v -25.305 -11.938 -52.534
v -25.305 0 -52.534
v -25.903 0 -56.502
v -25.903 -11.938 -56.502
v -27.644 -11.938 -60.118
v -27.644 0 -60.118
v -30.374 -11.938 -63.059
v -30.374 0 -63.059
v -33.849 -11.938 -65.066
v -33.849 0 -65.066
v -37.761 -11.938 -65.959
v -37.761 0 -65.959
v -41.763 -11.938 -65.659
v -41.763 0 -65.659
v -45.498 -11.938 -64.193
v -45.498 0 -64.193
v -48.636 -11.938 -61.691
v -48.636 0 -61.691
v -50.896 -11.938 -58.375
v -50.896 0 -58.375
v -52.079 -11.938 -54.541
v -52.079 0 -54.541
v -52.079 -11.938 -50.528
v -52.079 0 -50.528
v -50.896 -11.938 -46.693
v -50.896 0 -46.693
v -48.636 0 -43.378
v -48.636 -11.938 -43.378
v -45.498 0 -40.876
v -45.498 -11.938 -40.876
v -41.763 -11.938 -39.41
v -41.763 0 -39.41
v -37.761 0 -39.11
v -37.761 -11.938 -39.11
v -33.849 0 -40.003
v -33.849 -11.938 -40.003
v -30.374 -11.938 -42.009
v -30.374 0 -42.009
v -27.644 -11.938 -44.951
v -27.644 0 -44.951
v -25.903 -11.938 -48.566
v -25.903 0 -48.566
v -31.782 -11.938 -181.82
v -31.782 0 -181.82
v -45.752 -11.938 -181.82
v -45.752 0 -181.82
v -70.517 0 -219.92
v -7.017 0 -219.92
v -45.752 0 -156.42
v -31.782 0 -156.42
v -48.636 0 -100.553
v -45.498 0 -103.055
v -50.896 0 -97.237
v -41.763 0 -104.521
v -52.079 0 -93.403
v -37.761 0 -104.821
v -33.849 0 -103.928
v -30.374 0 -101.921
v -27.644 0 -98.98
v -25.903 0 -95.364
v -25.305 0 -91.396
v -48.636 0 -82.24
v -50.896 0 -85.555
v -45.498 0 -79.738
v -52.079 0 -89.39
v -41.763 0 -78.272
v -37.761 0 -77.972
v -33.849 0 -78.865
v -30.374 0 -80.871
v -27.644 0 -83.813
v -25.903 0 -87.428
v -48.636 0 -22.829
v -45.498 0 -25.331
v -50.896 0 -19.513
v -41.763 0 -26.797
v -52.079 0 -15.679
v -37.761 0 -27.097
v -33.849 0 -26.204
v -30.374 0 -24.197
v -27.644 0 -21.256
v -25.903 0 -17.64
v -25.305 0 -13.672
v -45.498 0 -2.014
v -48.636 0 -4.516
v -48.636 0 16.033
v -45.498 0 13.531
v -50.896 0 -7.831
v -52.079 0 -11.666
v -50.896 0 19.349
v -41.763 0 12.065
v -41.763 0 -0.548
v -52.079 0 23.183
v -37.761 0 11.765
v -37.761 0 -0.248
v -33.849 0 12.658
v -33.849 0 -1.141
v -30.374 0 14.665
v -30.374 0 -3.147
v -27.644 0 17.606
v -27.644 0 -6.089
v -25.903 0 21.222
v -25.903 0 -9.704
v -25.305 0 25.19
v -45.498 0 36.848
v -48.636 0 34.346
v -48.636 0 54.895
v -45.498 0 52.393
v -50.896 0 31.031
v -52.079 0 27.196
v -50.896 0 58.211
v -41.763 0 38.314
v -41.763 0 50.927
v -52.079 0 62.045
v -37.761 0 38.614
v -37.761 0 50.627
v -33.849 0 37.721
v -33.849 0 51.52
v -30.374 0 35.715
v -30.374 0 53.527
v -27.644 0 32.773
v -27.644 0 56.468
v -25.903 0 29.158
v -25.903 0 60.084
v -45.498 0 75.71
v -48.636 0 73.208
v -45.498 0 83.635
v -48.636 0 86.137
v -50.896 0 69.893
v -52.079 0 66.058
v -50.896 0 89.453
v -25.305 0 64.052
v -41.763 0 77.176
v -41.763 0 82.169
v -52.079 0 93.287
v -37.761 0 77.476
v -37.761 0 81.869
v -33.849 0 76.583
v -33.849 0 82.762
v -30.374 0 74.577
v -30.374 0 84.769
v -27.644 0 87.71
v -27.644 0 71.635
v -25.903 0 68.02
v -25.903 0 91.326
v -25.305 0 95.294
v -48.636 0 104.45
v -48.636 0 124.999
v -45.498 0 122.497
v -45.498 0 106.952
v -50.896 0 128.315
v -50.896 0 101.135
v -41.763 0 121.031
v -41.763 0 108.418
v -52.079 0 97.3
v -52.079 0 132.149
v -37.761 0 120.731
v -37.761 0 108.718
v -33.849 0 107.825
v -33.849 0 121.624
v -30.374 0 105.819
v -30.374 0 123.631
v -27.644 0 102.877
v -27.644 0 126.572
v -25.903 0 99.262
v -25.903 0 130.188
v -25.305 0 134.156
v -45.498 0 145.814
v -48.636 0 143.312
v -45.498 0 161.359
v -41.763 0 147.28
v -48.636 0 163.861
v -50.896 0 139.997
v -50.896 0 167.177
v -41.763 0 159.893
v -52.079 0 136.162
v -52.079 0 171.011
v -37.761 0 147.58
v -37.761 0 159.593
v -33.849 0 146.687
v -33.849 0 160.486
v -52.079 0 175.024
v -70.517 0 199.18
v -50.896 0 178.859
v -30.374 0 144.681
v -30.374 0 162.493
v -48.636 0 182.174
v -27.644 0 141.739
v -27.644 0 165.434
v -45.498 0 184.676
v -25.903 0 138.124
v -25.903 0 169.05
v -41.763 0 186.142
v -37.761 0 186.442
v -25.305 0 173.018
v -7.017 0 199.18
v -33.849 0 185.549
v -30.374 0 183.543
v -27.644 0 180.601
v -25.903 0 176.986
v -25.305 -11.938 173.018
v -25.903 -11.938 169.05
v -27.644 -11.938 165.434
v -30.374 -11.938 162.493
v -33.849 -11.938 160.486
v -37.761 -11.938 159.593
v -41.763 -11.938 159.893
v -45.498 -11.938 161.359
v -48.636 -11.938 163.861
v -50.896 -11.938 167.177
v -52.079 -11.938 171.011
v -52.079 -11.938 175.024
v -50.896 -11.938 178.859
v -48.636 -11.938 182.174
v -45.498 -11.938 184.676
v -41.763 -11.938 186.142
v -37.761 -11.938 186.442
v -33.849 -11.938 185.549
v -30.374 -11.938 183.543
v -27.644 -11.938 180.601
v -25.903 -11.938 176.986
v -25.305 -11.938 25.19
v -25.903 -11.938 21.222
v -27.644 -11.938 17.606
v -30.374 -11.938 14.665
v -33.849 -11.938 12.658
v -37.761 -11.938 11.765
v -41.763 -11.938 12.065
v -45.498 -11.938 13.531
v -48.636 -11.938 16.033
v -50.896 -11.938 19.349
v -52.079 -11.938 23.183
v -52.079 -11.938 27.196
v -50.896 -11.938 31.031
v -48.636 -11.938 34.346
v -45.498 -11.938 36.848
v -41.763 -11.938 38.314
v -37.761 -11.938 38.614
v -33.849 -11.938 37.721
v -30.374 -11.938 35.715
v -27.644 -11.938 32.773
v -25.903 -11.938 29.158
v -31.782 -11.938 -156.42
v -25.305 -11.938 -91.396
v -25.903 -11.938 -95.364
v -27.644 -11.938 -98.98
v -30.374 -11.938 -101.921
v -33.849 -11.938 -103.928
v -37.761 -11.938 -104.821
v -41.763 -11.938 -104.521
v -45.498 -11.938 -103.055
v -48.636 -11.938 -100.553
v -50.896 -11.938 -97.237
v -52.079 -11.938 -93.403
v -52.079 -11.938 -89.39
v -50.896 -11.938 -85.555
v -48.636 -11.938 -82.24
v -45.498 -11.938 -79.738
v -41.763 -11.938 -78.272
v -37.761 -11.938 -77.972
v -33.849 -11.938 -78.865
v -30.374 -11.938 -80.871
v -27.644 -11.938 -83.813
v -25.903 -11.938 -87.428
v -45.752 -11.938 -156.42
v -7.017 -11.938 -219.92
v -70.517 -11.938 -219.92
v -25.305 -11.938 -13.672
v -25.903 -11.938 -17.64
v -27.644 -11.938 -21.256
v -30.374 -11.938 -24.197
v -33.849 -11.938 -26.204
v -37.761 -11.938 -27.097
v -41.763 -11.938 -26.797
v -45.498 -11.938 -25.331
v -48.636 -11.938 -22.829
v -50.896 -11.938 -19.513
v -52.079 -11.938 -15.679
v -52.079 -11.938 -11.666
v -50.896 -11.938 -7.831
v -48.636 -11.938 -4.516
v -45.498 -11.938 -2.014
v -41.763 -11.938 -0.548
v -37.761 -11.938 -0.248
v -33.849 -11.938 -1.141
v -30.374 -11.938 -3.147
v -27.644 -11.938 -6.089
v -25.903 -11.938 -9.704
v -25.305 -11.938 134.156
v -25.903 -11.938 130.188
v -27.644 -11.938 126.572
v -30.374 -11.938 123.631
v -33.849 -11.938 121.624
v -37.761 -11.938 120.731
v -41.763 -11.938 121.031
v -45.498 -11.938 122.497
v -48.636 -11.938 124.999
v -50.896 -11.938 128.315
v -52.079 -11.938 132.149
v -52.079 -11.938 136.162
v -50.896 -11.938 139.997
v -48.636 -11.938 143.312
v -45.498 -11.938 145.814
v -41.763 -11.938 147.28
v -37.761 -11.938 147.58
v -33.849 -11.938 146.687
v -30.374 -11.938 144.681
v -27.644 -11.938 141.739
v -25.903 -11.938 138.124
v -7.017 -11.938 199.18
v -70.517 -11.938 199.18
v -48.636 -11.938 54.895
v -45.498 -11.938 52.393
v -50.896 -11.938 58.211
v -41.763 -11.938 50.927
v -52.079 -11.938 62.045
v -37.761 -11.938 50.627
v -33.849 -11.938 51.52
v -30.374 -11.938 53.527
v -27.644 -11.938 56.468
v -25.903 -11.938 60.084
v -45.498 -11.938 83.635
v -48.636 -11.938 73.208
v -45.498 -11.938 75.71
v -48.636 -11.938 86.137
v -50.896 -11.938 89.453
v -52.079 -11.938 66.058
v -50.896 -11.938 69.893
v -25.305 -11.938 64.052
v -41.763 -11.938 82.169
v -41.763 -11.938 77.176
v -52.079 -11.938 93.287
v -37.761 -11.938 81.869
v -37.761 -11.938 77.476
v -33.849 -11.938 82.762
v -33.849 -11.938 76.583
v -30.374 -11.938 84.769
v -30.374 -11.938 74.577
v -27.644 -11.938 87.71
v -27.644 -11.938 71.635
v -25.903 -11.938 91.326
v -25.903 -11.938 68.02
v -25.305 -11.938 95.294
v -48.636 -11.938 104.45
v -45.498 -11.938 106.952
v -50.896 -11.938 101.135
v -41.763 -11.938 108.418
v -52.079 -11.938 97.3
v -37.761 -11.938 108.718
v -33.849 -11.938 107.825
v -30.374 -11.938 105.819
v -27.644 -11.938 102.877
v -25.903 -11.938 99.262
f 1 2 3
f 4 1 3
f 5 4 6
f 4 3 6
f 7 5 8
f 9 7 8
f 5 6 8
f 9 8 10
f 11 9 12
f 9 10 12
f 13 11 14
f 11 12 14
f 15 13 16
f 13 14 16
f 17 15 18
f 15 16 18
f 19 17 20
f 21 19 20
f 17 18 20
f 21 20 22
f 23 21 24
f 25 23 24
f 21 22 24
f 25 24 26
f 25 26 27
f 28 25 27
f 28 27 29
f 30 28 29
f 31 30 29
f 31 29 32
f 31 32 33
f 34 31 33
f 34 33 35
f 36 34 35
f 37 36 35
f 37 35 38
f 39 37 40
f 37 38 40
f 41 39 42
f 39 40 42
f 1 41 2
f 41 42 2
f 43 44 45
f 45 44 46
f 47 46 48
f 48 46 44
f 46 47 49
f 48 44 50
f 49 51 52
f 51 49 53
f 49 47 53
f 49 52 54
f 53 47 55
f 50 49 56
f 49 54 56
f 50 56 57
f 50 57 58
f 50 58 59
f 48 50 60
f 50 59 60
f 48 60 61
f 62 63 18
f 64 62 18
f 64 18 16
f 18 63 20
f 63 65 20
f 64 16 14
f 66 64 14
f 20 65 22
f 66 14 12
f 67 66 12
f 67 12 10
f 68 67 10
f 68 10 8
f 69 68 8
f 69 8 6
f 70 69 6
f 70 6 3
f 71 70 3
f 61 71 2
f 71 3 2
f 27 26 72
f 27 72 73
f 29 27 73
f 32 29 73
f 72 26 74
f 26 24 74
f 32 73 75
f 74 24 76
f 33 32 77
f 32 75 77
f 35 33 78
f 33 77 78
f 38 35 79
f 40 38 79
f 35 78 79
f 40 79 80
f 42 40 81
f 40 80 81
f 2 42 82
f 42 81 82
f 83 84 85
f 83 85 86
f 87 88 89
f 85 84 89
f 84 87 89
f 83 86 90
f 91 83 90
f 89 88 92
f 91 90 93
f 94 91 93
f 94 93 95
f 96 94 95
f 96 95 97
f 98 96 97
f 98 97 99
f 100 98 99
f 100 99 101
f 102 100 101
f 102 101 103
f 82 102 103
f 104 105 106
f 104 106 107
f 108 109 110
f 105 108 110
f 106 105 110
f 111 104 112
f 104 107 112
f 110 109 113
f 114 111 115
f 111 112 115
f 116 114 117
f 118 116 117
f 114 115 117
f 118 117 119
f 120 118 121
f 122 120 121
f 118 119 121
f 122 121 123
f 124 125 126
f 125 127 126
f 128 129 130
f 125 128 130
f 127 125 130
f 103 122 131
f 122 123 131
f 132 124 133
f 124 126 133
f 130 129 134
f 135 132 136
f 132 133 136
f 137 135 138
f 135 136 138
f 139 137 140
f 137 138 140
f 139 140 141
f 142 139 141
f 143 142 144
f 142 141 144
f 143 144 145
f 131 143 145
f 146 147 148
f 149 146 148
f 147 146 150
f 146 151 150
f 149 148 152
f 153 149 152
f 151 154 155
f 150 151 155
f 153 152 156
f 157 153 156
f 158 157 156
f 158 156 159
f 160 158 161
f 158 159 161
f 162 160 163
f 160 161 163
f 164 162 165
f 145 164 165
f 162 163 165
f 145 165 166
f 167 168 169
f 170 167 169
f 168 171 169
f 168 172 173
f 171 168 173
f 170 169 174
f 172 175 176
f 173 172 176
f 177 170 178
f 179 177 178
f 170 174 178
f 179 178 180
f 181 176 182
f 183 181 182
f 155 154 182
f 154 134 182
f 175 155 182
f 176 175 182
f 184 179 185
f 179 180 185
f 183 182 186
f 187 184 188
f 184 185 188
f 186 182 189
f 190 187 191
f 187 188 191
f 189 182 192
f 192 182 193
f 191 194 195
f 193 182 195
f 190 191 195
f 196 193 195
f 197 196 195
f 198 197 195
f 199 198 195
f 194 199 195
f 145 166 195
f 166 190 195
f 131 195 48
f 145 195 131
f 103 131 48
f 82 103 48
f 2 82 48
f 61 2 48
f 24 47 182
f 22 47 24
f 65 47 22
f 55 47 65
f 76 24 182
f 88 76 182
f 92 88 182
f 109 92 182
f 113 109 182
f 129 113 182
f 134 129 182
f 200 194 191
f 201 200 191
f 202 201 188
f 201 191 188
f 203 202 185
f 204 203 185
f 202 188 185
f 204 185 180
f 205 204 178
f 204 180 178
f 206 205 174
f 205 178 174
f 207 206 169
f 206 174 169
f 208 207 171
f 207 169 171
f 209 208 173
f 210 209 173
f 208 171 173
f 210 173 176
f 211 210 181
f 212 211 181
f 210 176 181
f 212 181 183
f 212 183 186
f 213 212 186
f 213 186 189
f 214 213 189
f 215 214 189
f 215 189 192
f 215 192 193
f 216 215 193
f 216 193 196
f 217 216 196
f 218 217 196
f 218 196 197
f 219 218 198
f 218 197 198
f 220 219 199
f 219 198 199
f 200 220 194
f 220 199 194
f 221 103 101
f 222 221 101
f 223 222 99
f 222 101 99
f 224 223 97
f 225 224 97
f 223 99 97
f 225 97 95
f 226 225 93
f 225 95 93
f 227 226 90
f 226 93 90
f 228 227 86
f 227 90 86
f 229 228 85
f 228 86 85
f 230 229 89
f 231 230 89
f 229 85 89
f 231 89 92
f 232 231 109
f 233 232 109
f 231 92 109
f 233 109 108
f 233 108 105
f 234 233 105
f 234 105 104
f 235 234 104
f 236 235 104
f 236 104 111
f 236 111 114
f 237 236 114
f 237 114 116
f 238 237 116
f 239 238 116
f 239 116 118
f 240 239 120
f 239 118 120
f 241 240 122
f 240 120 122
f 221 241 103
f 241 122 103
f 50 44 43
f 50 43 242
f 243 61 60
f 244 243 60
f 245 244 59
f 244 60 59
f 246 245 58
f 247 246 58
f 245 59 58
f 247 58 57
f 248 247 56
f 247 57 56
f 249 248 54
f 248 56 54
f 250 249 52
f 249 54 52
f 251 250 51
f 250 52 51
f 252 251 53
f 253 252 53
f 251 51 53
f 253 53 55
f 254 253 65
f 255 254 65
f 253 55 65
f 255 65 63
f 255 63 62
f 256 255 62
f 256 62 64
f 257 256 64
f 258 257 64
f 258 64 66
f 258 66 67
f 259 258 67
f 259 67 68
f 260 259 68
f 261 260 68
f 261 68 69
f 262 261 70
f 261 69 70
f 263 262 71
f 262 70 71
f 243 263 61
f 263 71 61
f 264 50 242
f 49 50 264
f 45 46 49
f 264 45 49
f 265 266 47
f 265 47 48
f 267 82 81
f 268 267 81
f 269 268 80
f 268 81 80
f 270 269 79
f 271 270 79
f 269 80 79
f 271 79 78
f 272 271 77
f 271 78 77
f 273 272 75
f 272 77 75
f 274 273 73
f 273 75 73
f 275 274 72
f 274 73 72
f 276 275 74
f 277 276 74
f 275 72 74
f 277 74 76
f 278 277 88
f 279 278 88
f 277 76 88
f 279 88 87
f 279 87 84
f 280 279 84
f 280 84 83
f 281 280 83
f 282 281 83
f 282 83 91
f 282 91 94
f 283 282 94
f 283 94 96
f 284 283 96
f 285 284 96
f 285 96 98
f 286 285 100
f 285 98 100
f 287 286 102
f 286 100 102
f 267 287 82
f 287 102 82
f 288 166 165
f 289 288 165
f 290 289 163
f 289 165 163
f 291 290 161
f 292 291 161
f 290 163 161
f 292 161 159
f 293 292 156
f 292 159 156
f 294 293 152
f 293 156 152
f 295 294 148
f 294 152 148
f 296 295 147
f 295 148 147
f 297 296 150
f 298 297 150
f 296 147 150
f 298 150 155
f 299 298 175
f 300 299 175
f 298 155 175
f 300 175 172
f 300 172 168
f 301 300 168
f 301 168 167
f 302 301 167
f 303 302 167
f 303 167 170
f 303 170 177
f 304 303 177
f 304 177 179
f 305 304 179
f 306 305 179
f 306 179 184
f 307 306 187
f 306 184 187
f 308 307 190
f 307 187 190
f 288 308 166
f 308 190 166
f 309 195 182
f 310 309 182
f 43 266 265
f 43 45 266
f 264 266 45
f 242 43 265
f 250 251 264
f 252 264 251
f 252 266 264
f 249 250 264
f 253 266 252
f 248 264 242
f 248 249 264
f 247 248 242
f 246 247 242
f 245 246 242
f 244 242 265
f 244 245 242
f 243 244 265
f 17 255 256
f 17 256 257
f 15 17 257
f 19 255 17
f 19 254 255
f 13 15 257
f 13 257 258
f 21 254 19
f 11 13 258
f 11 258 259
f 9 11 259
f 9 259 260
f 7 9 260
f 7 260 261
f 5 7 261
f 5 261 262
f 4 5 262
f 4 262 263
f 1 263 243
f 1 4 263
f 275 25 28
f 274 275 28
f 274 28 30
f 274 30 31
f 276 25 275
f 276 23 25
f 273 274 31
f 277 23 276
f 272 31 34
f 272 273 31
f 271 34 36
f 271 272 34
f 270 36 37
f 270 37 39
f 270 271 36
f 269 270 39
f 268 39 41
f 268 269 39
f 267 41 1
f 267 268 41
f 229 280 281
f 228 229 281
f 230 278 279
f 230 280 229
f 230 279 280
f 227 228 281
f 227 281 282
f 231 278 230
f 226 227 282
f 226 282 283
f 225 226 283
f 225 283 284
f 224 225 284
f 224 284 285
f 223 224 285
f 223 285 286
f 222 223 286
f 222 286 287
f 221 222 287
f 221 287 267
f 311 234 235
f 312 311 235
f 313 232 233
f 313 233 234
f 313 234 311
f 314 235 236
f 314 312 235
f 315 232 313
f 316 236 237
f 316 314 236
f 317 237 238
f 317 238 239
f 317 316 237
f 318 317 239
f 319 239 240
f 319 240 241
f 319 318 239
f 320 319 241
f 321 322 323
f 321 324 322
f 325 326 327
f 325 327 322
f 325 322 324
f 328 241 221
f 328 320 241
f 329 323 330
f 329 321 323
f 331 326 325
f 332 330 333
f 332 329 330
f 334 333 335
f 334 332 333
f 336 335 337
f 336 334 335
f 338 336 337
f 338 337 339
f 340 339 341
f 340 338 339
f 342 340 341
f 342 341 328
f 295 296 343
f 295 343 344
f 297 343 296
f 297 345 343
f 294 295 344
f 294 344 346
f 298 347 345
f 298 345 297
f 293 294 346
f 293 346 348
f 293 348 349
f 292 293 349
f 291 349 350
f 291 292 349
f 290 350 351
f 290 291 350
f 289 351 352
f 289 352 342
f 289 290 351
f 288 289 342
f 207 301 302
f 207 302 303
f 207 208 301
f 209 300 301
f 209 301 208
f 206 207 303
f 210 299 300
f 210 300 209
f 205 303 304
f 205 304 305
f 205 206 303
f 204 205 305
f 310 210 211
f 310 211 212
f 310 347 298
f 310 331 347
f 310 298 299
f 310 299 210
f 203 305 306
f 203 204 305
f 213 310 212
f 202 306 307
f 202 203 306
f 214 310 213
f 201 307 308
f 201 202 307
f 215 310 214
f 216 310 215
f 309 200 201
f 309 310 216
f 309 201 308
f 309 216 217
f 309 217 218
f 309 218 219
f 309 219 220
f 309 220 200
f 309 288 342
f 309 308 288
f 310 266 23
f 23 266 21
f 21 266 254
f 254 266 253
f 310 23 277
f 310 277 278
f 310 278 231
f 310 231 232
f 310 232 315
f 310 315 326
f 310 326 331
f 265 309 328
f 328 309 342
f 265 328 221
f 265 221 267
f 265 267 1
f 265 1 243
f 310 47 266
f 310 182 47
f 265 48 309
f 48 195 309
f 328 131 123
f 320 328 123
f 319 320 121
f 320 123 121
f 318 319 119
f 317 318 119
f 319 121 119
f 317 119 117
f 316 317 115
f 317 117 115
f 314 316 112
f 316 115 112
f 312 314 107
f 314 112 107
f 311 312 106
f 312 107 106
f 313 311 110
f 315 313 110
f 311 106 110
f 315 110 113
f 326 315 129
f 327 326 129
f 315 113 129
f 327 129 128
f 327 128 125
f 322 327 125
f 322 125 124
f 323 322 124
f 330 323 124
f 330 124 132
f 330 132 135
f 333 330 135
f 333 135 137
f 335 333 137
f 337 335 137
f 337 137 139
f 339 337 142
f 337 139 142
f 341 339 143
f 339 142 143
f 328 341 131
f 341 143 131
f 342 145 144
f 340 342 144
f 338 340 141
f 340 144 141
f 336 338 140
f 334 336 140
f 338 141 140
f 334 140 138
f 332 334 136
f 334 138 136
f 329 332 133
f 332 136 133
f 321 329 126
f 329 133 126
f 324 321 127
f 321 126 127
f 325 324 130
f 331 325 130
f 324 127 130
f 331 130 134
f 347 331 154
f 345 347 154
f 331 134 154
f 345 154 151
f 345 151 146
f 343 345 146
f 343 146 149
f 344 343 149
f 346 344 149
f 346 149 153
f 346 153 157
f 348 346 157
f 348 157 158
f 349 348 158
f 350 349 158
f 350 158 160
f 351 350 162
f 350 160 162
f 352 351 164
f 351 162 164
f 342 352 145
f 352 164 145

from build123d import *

# Parameters (mm, degrees)
F0_W     = 63.5
F0_H     = 38.862
F0_H_2   = 26.162
F0_H_3   = 12.7
F1_DEPTH = 11.938
F2_W     = 13.97
F2_H     = 25.4
F3_DEPTH = 25.4
F4_W     = 63.5
F4_H     = 11.938
F5_DEPTH = 11.938


with BuildPart() as f1:
    # F0 (on Front) → F1 (new body)
    with BuildSketch(Plane.XZ):
        with BuildLine():
            Line((-70.517269, 199.179671), (-70.517269, 173.017671))
            Line((-70.517269, 173.017671), (-52.229269, 173.017671))
            ThreePointArc((-52.229269, 173.017671), (-38.767269, 186.479671), (-25.305269, 173.017671))
            Line((-25.305269, 173.017671), (-7.017269, 173.017671))
            Line((-7.017269, 173.017671), (-7.017269, 199.179671))
            Line((-7.017269, 199.179671), (-70.517269, 199.179671))
        make_face()
        with BuildLine():
            Line((-70.517269, 173.017671), (-70.517269, 134.155671))
            Line((-70.517269, 134.155671), (-52.229269, 134.155671))
            ThreePointArc((-52.229269, 134.155671), (-38.767269, 147.617671), (-25.305269, 134.155671))
            Line((-25.305269, 134.155671), (-7.017269, 134.155671))
            Line((-7.017269, 134.155671), (-7.017269, 173.017671))
            Line((-7.017269, 173.017671), (-25.305269, 173.017671))
            ThreePointArc((-25.305269, 173.017671), (-38.767269, 159.555671), (-52.229269, 173.017671))
            Line((-52.229269, 173.017671), (-70.517269, 173.017671))
        make_face()
        with BuildLine():
            Line((-70.517269, 134.155671), (-70.517269, 95.293671))
            Line((-70.517269, 95.293671), (-52.229269, 95.293671))
            ThreePointArc((-52.229269, 95.293671), (-38.767269, 108.755671), (-25.305269, 95.293671))
            Line((-25.305269, 95.293671), (-7.017269, 95.293671))
            Line((-7.017269, 95.293671), (-7.017269, 134.155671))
            Line((-7.017269, 134.155671), (-25.305269, 134.155671))
            ThreePointArc((-25.305269, 134.155671), (-38.767269, 120.693671), (-52.229269, 134.155671))
            Line((-52.229269, 134.155671), (-70.517269, 134.155671))
        make_face()
        with BuildLine():
            Line((-70.517269, 95.293671), (-70.517269, 64.051671))
            Line((-70.517269, 64.051671), (-52.229269, 64.051671))
            ThreePointArc((-52.229269, 64.051671), (-38.767269, 77.513671), (-25.305269, 64.051671))
            Line((-25.305269, 64.051671), (-7.017269, 64.051671))
            Line((-7.017269, 64.051671), (-7.017269, 95.293671))
            Line((-7.017269, 95.293671), (-25.305269, 95.293671))
            ThreePointArc((-25.305269, 95.293671), (-38.767269, 81.831671), (-52.229269, 95.293671))
            Line((-52.229269, 95.293671), (-70.517269, 95.293671))
        make_face()
        with BuildLine():
            Line((-70.517269, 64.051671), (-70.517269, 25.189671))
            Line((-70.517269, 25.189671), (-52.229269, 25.189671))
            ThreePointArc((-52.229269, 25.189671), (-38.767269, 38.651671), (-25.305269, 25.189671))
            Line((-25.305269, 25.189671), (-7.017269, 25.189671))
            Line((-7.017269, 25.189671), (-7.017269, 64.051671))
            Line((-7.017269, 64.051671), (-25.305269, 64.051671))
            ThreePointArc((-25.305269, 64.051671), (-38.767269, 50.589671), (-52.229269, 64.051671))
            Line((-52.229269, 64.051671), (-70.517269, 64.051671))
        make_face()
        with BuildLine():
            Line((-70.517269, 25.189671), (-70.517269, -13.672329))
            Line((-70.517269, -13.672329), (-52.229269, -13.672329))
            ThreePointArc((-52.229269, -13.672329), (-38.767269, -0.210329), (-25.305269, -13.672329))
            Line((-25.305269, -13.672329), (-7.017269, -13.672329))
            Line((-7.017269, -13.672329), (-7.017269, 25.189671))
            Line((-7.017269, 25.189671), (-25.305269, 25.189671))
            ThreePointArc((-25.305269, 25.189671), (-38.767269, 11.727671), (-52.229269, 25.189671))
            Line((-52.229269, 25.189671), (-70.517269, 25.189671))
        make_face()
        with BuildLine():
            Line((-70.517269, -13.672329), (-70.517269, -52.534329))
            Line((-70.517269, -52.534329), (-52.229269, -52.534329))
            ThreePointArc((-52.229269, -52.534329), (-38.767269, -39.072329), (-25.305269, -52.534329))
            Line((-25.305269, -52.534329), (-7.017269, -52.534329))
            Line((-7.017269, -52.534329), (-7.017269, -13.672329))
            Line((-7.017269, -13.672329), (-25.305269, -13.672329))
            ThreePointArc((-25.305269, -13.672329), (-38.767269, -27.134329), (-52.229269, -13.672329))
            Line((-52.229269, -13.672329), (-70.517269, -13.672329))
        make_face()
        with BuildLine():
            Line((-70.517269, -52.534329), (-70.517269, -91.396329))
            Line((-70.517269, -91.396329), (-52.229269, -91.396329))
            ThreePointArc((-52.229269, -91.396329), (-38.767269, -77.934329), (-25.305269, -91.396329))
            Line((-25.305269, -91.396329), (-7.017269, -91.396329))
            Line((-7.017269, -91.396329), (-7.017269, -52.534329))
            Line((-7.017269, -52.534329), (-25.305269, -52.534329))
            ThreePointArc((-25.305269, -52.534329), (-38.767269, -65.996329), (-52.229269, -52.534329))
            Line((-52.229269, -52.534329), (-70.517269, -52.534329))
        make_face()
        with BuildLine():
            Line((-70.517269, -91.396329), (-70.517269, -130.258329))
            Line((-70.517269, -130.258329), (-7.017269, -130.258329))
            Line((-7.017269, -130.258329), (-7.017269, -91.396329))
            Line((-7.017269, -91.396329), (-25.305269, -91.396329))
            ThreePointArc((-25.305269, -91.396329), (-38.767269, -104.858329), (-52.229269, -91.396329))
            Line((-52.229269, -91.396329), (-70.517269, -91.396329))
        make_face()
        with Locations((-38.767269, -149.689329)):
            Rectangle(F0_W, F0_H)
        with Locations((-38.767269, -182.201329)):
            Rectangle(F0_W, F0_H_2)
        with Locations((-38.767269, -201.632329)):
            Rectangle(F0_W, F0_H_3)
    extrude(amount=F1_DEPTH)

    # F2 (on face) → F3 (cut)
    with BuildSketch(Plane(origin=(0, 0, 0), x_dir=(-1, 0, 0), z_dir=(0, 1, 0))):
        with Locations((38.767269, -169.120329)):
            Rectangle(F2_W, F2_H)
    extrude(amount=-F3_DEPTH, mode=Mode.SUBTRACT)

    # F4 (on face) → F5 (join)
    with BuildSketch(Plane(origin=(0, 0, -207.982329), x_dir=(1, 0, 0), z_dir=(0, 0, -1))):
        with Locations((-38.767269, 5.969)):
            Rectangle(F4_W, F4_H)
    extrude(amount=F5_DEPTH)


solid = f1.part
